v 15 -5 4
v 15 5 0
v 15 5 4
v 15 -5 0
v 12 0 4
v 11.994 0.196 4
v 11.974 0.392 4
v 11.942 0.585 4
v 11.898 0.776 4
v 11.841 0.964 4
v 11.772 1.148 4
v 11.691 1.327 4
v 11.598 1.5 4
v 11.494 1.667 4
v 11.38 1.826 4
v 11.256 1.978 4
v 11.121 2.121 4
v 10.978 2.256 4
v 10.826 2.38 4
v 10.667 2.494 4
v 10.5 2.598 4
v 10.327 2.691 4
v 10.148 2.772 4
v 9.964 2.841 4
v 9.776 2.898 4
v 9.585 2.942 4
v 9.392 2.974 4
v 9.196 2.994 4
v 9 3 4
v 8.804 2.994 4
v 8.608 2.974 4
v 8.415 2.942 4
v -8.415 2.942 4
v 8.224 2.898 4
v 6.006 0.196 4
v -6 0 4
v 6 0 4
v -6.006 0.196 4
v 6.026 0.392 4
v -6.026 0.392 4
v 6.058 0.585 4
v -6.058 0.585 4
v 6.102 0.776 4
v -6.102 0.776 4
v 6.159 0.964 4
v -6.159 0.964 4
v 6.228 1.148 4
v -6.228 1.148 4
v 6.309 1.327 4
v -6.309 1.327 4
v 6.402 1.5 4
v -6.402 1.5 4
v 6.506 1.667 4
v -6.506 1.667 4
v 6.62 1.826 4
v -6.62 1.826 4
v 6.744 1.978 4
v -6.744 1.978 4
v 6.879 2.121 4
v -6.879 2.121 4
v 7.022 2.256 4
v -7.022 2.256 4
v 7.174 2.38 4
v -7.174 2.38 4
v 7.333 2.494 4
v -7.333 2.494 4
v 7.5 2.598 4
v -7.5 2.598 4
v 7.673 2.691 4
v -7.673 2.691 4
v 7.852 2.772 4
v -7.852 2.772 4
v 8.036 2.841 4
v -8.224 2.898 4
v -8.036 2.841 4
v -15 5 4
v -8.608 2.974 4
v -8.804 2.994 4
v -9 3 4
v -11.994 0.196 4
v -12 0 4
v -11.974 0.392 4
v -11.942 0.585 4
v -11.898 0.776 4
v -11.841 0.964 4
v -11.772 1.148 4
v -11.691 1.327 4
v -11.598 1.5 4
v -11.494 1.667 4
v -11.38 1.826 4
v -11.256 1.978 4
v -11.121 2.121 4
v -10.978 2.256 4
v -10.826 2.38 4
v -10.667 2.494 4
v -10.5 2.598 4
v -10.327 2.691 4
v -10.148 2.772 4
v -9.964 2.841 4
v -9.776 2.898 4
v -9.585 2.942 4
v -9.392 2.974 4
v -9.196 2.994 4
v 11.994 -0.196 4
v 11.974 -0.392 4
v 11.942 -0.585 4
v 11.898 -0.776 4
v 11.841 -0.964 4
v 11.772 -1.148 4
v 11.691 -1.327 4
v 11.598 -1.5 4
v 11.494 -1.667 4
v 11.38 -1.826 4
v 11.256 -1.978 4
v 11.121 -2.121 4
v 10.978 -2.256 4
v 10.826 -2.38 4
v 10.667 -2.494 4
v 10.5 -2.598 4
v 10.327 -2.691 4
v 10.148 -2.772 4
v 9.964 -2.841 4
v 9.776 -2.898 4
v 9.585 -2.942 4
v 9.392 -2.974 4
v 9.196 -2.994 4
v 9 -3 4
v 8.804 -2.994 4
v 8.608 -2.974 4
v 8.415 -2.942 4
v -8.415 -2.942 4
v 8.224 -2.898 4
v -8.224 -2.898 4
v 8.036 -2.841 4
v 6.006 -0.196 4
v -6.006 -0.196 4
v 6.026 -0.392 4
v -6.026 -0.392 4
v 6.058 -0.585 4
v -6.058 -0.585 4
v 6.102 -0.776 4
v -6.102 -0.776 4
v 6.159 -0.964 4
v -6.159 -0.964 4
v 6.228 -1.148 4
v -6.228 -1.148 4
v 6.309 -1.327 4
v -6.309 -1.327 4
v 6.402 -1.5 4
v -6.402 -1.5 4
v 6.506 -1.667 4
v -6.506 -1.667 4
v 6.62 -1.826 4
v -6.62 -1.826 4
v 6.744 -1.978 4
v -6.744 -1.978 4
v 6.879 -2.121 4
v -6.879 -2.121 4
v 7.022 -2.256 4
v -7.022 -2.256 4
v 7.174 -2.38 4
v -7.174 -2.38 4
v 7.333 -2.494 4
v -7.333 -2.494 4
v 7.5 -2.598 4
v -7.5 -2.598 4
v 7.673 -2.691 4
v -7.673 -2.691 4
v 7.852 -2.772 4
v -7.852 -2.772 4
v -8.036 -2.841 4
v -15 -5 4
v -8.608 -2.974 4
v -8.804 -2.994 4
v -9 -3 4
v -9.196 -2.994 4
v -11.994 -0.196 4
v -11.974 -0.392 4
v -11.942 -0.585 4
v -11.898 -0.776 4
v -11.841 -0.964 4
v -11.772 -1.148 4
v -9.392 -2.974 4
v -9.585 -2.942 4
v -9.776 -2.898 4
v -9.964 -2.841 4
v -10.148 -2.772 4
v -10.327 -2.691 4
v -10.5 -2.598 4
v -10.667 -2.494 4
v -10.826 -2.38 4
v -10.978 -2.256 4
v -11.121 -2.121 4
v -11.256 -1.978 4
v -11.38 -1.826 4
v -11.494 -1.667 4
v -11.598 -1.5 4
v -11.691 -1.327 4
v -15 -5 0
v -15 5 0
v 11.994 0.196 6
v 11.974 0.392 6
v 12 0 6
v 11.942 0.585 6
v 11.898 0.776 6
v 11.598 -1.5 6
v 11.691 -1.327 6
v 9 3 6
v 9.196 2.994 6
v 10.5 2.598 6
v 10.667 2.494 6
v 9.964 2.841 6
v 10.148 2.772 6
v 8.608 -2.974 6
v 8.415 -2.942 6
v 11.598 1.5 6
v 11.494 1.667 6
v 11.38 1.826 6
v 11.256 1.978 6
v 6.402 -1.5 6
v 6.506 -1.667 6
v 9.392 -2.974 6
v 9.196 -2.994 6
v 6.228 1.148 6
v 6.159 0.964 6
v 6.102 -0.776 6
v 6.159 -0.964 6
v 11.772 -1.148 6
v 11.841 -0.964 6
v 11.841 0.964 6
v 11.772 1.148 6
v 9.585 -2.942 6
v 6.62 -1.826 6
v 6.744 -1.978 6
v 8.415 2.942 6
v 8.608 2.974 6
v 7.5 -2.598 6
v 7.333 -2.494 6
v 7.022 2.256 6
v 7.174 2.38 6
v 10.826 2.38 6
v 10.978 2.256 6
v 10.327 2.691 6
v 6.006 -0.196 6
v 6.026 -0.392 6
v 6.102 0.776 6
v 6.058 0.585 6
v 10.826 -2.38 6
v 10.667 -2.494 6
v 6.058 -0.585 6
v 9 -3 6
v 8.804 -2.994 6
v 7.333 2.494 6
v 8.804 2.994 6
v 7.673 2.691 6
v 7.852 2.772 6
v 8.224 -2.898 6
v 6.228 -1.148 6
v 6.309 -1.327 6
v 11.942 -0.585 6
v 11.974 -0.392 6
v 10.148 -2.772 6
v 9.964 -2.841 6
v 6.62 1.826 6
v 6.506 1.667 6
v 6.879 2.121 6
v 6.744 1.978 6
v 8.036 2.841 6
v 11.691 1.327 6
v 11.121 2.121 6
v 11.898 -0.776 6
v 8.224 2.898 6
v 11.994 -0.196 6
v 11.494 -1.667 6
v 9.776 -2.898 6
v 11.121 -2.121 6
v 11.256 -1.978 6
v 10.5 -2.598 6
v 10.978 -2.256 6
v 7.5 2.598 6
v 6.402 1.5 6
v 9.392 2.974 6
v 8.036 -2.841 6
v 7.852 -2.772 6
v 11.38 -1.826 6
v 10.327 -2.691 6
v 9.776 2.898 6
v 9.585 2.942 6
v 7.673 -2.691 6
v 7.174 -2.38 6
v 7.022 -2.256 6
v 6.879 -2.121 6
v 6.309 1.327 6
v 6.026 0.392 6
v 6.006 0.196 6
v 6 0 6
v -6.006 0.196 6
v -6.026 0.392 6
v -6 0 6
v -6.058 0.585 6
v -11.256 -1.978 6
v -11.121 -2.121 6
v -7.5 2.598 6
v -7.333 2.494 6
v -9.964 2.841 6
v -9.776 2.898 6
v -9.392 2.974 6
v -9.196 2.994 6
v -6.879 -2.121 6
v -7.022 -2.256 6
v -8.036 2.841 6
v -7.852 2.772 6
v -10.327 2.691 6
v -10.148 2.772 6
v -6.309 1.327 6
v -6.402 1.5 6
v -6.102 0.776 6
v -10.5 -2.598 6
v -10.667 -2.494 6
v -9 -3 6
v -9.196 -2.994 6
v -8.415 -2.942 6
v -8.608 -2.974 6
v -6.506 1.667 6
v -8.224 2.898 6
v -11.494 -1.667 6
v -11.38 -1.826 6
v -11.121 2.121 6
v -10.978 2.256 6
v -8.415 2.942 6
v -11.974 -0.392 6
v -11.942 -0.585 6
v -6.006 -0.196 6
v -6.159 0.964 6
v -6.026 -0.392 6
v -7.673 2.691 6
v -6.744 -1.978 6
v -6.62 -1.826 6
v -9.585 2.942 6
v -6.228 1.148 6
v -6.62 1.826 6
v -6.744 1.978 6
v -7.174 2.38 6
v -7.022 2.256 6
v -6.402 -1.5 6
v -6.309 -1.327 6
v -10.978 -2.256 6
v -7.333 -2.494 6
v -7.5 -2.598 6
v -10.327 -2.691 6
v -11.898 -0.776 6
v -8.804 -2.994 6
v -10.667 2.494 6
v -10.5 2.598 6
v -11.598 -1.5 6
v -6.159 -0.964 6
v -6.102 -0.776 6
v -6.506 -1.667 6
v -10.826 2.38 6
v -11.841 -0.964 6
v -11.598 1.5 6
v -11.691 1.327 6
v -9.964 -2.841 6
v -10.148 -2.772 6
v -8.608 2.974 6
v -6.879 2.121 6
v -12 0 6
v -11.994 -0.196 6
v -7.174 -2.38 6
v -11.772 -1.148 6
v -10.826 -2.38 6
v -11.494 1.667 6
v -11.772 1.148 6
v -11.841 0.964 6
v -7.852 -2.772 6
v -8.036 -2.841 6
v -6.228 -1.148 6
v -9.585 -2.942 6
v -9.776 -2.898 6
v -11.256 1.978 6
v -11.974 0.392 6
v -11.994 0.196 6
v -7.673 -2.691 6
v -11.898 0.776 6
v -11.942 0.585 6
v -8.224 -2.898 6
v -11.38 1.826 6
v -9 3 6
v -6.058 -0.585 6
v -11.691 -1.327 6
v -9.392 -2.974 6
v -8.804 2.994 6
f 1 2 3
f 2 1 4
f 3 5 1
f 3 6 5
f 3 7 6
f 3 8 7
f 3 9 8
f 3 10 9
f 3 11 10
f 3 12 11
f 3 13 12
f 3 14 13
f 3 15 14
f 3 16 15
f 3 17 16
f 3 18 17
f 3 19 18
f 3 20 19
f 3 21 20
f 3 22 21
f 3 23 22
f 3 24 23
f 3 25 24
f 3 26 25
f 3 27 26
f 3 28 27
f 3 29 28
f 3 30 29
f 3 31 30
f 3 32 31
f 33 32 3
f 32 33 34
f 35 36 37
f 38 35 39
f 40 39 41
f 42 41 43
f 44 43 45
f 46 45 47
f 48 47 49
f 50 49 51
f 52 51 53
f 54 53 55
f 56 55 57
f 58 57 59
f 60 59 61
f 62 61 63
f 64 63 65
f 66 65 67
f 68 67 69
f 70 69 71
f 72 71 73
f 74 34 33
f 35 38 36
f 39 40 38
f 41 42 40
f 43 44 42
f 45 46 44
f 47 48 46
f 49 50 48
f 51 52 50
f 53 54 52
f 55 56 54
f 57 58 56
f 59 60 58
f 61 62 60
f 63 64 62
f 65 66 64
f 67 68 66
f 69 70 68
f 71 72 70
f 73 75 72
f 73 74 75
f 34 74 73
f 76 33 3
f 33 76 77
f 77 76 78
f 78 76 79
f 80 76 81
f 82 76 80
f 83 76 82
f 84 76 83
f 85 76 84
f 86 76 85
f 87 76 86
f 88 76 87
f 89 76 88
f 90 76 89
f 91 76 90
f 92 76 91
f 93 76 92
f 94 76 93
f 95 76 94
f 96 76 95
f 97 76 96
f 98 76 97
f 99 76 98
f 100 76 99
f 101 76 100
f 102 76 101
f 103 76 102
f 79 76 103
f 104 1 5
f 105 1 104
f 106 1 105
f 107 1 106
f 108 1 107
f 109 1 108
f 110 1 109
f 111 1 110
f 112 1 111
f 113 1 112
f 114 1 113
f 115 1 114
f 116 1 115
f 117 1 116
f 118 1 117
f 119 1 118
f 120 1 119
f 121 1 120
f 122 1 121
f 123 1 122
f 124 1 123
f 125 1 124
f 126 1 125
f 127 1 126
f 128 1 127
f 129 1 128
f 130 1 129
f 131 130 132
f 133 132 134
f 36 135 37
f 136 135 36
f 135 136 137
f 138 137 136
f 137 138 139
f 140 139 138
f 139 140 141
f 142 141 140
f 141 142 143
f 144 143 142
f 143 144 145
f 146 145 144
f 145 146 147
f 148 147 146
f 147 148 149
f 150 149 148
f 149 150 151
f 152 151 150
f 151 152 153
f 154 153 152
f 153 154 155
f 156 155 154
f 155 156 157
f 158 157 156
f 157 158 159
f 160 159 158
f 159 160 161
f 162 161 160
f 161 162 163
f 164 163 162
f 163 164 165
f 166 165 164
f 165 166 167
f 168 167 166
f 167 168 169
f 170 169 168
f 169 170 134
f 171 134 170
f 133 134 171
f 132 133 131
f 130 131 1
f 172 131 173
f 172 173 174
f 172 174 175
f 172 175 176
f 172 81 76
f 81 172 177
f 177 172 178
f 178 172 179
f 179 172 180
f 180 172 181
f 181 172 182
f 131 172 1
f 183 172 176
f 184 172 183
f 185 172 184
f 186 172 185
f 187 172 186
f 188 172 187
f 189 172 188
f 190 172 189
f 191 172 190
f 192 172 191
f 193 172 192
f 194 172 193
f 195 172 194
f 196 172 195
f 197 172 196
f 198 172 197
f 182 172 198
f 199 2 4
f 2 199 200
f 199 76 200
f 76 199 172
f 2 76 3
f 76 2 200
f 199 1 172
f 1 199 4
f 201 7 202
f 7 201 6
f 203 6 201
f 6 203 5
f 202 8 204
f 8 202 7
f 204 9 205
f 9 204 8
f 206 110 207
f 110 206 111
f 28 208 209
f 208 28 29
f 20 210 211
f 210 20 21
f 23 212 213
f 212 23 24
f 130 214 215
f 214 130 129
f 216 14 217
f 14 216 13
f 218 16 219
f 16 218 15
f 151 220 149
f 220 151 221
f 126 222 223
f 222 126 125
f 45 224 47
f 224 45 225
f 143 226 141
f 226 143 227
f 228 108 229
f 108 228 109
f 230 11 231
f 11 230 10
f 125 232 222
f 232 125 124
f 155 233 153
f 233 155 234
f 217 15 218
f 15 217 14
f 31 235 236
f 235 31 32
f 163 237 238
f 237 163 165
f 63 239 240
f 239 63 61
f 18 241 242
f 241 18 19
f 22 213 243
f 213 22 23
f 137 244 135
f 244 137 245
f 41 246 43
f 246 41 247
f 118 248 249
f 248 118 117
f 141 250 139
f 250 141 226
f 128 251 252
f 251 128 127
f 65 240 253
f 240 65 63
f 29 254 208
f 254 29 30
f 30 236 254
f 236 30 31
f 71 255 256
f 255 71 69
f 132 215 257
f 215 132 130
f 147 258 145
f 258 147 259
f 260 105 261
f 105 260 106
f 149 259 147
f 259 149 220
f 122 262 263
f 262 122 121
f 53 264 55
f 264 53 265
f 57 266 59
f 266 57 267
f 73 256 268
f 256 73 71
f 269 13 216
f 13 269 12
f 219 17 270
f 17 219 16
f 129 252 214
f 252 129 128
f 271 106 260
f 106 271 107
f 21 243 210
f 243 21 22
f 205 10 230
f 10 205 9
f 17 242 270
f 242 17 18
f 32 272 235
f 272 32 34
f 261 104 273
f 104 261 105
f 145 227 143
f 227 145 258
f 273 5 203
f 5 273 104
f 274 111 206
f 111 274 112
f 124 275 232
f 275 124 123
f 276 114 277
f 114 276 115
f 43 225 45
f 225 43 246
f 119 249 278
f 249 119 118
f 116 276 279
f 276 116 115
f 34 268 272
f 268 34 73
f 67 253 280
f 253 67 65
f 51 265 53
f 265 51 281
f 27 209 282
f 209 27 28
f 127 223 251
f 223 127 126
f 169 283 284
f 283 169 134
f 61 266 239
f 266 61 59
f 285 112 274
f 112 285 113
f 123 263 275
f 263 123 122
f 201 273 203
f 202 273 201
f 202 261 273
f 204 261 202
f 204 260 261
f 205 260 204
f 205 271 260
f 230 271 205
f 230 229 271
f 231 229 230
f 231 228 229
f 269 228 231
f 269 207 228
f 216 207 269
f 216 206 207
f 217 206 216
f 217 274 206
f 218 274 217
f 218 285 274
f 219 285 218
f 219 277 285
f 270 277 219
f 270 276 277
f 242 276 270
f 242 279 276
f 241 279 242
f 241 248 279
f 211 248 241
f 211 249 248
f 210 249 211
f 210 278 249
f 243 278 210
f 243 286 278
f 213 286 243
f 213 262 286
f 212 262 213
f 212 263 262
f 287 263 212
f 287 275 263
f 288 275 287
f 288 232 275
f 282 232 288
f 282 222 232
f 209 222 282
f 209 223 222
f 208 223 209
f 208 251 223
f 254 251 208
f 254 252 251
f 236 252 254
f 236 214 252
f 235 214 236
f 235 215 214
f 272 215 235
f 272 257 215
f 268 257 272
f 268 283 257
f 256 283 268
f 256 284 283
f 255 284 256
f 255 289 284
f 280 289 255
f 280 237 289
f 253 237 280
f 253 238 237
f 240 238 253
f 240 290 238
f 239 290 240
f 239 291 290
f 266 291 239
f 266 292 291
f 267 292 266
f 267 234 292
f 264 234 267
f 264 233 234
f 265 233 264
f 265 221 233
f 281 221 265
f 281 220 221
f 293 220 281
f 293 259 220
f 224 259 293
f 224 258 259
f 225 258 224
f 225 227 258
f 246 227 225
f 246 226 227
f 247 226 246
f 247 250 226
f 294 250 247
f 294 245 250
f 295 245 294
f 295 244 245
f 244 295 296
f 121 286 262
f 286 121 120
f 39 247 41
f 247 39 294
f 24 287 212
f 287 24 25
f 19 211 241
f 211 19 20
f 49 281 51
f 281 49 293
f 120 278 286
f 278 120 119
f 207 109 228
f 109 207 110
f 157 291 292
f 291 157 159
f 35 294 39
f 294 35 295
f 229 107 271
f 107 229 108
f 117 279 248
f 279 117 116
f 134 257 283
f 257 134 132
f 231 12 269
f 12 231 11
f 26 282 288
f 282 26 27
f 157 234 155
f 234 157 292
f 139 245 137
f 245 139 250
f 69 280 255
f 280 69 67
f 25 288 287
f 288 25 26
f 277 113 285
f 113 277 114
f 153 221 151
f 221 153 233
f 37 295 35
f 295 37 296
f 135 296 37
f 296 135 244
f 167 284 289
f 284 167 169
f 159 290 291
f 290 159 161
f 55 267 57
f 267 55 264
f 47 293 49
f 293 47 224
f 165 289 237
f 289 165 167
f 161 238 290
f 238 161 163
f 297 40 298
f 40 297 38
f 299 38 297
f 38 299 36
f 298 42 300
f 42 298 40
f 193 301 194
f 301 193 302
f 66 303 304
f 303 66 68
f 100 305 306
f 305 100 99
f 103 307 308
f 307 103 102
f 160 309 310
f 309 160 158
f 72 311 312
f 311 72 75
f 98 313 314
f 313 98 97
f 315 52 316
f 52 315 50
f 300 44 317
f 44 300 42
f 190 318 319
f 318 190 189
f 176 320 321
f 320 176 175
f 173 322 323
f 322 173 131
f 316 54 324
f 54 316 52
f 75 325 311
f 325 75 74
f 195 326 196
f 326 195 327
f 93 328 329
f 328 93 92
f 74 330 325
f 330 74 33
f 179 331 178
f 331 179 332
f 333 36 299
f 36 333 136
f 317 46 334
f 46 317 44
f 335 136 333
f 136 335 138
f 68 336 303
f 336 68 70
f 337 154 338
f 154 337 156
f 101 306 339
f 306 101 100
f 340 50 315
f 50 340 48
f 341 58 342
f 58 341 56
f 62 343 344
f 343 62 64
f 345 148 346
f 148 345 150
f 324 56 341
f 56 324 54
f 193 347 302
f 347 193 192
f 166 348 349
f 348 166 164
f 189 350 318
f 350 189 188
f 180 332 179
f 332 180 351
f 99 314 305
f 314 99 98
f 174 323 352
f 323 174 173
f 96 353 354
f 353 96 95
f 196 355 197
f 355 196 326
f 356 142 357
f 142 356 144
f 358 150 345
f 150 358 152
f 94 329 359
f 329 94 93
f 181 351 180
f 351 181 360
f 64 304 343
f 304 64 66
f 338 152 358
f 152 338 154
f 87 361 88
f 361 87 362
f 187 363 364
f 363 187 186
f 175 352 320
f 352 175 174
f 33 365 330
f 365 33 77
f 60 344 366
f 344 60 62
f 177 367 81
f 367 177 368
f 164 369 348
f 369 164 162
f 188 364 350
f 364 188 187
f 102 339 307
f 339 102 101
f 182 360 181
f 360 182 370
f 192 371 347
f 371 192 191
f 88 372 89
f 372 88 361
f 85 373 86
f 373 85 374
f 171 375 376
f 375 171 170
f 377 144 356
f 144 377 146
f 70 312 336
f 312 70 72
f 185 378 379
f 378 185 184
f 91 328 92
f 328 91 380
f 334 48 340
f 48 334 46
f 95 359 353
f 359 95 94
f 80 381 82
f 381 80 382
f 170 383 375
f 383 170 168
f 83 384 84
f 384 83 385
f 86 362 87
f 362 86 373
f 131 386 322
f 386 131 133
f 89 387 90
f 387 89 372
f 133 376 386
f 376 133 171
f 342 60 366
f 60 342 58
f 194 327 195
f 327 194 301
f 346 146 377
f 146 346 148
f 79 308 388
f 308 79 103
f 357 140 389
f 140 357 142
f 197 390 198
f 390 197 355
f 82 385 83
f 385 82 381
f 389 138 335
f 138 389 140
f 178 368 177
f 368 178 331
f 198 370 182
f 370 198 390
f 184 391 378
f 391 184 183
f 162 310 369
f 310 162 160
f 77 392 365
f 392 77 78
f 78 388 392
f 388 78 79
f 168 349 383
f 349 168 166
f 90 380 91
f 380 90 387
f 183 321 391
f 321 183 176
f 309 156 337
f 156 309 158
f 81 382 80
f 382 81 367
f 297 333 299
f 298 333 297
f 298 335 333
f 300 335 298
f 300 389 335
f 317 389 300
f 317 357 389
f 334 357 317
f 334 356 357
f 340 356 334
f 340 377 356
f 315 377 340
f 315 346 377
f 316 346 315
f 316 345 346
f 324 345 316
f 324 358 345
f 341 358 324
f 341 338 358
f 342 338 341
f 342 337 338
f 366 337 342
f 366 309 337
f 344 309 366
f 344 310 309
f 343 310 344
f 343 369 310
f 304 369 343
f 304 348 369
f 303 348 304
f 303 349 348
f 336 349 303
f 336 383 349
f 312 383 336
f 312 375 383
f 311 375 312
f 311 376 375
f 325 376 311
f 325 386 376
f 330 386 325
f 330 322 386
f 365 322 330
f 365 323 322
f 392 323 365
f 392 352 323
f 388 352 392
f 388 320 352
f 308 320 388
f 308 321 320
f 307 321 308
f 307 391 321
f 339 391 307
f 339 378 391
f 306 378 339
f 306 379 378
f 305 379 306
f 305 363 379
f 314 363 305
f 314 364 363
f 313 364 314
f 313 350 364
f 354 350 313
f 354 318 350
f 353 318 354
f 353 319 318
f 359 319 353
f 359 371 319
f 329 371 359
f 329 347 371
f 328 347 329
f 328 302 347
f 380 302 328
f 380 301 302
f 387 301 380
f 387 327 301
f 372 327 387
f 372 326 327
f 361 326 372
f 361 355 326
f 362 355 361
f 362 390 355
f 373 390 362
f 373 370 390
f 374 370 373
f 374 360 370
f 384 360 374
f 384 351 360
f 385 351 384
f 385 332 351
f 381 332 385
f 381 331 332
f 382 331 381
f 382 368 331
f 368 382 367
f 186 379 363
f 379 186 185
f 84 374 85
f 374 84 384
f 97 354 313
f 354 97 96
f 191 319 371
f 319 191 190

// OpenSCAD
// Auto-generated from tests/data/feature_fixtures_manifest.json
// fixture: non_revolve_symmetric_composite
// fixture_type: non_revolve
// description: Plate with mirrored bosses; symmetric but not a revolve.
$fn = 96;

plate = [30.000000, 10.000000, 4.000000];

translate([-plate[0]/2, -plate[1]/2, 0]) cube(plate);
translate([9.000000, 0, 4.000000]) cylinder(h=2.000000, d=6.000000);
translate([-9.000000, 0, 4.000000]) cylinder(h=2.000000, d=6.000000);
